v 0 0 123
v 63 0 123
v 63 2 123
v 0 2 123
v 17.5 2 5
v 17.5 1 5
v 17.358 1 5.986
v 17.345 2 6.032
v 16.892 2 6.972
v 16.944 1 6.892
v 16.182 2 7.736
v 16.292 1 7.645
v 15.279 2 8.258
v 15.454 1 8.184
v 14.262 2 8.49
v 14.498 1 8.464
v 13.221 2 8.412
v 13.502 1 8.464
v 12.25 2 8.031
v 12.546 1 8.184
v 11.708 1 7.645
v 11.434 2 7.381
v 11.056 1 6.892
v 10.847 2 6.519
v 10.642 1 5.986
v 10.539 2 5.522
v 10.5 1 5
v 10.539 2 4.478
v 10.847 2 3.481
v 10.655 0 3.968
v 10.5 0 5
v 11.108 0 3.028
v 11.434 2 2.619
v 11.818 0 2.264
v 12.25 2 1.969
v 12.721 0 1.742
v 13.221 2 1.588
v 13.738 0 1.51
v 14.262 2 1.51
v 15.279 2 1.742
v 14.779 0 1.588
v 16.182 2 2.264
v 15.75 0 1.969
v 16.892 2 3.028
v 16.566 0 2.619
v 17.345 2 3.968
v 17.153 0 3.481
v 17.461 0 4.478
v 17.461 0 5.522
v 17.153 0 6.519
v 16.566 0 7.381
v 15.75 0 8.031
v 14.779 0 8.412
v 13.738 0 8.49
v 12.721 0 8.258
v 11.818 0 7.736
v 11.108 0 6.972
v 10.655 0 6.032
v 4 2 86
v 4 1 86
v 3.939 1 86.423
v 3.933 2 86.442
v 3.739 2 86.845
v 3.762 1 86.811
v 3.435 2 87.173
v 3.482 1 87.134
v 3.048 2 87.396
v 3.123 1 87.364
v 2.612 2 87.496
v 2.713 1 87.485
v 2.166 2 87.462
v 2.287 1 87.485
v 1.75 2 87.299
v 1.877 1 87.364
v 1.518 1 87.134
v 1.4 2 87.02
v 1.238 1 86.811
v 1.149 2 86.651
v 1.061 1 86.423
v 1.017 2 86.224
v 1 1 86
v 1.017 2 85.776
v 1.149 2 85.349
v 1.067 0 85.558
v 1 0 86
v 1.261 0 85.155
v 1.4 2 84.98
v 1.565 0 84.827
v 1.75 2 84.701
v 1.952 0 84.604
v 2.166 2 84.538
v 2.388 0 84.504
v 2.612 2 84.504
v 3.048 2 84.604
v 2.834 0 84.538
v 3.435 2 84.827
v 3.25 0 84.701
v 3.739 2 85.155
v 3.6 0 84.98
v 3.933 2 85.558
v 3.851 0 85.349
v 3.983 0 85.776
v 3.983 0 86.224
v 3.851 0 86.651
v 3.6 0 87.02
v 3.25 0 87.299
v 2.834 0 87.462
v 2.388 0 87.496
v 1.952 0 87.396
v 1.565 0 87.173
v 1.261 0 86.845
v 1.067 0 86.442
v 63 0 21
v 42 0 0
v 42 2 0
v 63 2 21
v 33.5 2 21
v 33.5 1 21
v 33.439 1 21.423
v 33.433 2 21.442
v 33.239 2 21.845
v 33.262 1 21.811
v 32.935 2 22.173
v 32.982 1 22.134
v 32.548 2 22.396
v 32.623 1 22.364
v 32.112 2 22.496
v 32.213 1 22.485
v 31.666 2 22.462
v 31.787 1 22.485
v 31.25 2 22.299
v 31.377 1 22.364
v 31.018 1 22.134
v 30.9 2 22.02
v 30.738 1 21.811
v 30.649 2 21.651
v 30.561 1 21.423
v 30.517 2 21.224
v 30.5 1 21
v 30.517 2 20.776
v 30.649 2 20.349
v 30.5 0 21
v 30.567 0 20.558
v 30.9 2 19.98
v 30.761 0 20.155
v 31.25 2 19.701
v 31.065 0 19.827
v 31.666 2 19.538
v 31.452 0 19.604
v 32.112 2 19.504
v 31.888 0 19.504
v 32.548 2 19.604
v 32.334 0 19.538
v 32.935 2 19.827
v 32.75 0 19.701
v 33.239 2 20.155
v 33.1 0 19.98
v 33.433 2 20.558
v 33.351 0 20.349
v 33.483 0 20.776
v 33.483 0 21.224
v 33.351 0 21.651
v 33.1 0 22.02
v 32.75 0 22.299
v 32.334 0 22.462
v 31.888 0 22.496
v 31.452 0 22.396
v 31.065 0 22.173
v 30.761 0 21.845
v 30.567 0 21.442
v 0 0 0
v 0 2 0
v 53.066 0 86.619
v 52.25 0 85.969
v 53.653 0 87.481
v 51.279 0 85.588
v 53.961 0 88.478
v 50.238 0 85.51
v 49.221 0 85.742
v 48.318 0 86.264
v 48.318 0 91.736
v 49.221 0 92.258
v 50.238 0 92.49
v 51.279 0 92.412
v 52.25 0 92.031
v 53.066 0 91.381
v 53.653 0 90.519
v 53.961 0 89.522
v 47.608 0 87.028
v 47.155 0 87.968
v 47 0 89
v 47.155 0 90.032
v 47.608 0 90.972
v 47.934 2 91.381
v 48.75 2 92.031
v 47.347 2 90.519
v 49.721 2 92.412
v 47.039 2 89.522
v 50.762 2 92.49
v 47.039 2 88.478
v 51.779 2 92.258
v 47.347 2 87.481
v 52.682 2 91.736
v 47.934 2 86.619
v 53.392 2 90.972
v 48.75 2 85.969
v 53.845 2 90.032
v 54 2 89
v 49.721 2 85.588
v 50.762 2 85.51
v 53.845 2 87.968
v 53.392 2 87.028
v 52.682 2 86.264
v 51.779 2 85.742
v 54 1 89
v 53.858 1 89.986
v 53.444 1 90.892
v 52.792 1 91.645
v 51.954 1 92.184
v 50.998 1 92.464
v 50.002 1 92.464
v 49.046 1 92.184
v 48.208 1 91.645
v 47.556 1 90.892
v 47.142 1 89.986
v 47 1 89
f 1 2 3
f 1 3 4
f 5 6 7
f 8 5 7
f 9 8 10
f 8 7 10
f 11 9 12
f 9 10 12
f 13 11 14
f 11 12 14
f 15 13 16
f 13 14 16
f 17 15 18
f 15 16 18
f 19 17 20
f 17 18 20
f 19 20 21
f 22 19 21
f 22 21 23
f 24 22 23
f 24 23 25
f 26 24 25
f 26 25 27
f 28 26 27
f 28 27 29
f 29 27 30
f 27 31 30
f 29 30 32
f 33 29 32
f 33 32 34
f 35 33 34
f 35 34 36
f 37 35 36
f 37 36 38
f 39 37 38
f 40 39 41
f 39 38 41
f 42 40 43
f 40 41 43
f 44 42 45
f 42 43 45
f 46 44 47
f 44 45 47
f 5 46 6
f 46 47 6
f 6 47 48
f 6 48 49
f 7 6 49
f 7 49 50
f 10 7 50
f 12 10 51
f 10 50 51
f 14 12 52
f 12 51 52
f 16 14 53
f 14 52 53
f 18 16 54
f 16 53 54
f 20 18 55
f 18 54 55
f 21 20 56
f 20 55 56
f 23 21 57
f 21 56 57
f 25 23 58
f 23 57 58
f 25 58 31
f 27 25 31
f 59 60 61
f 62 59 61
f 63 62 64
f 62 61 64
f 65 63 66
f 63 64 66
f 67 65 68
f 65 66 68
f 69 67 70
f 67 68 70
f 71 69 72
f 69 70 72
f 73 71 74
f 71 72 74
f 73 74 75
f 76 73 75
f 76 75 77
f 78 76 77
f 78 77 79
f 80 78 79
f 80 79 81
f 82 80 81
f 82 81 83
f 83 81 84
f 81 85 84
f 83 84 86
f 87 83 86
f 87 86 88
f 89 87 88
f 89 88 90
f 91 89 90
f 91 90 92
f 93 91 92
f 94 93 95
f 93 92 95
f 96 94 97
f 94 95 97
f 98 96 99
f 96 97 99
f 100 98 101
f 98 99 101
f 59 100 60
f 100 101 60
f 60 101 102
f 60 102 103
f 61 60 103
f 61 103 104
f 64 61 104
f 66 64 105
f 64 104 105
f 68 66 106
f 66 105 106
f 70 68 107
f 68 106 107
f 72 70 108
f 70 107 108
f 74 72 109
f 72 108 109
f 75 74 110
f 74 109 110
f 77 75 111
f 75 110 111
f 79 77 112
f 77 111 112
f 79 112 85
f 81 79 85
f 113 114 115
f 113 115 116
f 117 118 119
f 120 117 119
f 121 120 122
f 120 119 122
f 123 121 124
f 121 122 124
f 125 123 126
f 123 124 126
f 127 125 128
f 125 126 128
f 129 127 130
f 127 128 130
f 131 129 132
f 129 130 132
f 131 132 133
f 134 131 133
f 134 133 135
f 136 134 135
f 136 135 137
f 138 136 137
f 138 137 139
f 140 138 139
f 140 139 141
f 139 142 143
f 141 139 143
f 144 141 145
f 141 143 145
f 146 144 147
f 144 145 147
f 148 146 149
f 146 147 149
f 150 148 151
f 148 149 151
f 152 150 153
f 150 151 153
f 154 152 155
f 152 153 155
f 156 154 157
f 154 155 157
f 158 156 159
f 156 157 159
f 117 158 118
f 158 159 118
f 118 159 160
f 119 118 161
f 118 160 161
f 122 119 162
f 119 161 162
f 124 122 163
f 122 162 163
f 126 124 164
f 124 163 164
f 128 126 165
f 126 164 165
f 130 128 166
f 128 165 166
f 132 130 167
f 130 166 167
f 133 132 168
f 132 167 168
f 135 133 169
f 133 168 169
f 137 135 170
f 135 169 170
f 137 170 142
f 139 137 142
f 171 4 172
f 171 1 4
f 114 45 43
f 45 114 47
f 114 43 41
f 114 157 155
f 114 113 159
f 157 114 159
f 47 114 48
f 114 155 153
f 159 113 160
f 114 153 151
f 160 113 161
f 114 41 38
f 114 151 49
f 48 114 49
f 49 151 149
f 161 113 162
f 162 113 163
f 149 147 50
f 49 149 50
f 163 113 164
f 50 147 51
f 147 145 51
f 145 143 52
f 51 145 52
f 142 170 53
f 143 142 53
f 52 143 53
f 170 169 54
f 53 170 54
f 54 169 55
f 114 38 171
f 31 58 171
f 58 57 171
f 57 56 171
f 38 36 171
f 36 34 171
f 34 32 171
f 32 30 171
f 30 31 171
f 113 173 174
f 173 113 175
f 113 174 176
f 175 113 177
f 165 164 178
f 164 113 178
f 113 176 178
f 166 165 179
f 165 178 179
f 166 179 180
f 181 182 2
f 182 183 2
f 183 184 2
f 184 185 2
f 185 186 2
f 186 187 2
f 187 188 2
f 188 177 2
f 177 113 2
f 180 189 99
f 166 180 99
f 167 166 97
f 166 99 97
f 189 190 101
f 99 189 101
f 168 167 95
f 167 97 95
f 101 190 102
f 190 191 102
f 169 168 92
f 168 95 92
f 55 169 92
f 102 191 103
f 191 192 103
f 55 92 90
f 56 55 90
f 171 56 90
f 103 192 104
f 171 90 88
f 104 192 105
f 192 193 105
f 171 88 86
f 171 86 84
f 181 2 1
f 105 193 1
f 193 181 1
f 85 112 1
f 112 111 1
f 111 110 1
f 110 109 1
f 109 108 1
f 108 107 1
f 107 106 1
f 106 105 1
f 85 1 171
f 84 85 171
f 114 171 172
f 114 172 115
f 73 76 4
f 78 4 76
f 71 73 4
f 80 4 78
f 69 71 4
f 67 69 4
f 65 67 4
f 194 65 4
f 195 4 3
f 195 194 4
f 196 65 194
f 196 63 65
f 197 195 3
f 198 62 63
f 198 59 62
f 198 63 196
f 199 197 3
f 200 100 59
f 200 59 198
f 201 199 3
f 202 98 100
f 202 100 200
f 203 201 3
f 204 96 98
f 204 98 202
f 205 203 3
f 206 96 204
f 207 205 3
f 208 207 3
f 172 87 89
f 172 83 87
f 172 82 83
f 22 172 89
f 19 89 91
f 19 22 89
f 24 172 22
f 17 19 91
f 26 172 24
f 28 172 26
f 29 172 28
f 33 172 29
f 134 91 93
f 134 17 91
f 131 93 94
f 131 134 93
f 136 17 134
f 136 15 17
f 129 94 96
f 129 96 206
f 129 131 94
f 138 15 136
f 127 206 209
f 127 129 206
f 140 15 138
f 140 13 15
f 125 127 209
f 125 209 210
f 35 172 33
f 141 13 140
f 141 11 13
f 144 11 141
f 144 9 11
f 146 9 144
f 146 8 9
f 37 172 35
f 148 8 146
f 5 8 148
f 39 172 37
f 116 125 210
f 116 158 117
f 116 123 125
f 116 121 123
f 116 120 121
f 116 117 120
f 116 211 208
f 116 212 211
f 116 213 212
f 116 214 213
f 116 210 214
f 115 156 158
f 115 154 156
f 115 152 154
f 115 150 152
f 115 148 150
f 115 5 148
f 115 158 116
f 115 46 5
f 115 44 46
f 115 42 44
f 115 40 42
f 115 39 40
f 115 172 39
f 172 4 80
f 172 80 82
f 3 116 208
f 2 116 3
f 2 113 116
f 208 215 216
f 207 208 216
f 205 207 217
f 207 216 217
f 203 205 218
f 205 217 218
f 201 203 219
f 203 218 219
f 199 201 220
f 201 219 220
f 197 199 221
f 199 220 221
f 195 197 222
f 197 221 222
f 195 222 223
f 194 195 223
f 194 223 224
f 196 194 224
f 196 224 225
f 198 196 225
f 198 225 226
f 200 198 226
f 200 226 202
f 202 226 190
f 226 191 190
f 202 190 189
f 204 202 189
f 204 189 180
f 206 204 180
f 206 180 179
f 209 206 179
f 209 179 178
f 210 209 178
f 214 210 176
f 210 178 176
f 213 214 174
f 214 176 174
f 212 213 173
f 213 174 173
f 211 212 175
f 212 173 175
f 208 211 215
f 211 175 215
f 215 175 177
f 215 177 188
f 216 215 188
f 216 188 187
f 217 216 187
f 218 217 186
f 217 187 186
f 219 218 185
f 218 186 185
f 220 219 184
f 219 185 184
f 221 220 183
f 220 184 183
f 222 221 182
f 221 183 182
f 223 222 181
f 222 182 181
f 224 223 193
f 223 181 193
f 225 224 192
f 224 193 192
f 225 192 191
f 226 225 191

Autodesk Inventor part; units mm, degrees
ref_plane "YZ Plane" through (0, 0, 0) normal (1, 0, 0) x (0, 1, 0)
ref_plane "XZ Plane" through (0, 0, 0) normal (0, 1, 0) x (-1, 0, 0)
ref_plane "XY Plane" through (0, 0, 0) normal (0, 0, 1) x (1, 0, 0)
sketch "Skizze1" plane through (0, 0, 0) normal (0, 1, 0) x (-1, 0, 0)
  line L0 (0, 0) -> (-42, 0)
  line L1 (-63, 21) -> (-63, 123)
  line L2 (-63, 123) -> (0, 123)
  line L3 (0, 123) -> (0, 0)
  line L4 (-42, 0) -> (-63, 21)
  line L5 (-42, 0) -> (-12.3015, 0) construction
  circle A0 centre (-14, 5) radius 3.5
  circle A1 centre (-32, 21) radius 1.5
  circle A2 centre (-2.5, 86) radius 1.5
  circle A3 centre (-50.5, 89) radius 3.5
  dimension "d0" = 63
  dimension "d1" = 102
  dimension "d2" = 135
  dimension "d3" = 42
  dimension "d4" = 7
  dimension "d5" = 3
  dimension "d6" = 3
  dimension "d7" = 7
  dimension "d8" = 2.5
  dimension "d9" = 37
  dimension "d10" = 14
  dimension "d11" = 5
  dimension "d12" = 21
  dimension "d13" = 32
  dimension "d14" = 12.5
  dimension "d15" = 34
extrude "Extrusion1" add sketch "Skizze1" along normal blind 1
sketch "Sketch2" plane through (0, 1, 0) normal (0, 1, 0) x (1, 0, 0)
  circle A0 centre (50.5, -89) radius 3.5 projected
  circle A1 centre (14, -5) radius 3.5 projected
  circle A2 centre (2.5, -86) radius 1.5 projected
  circle A3 centre (32, -21) radius 1.5 projected
  line L0 (42, 0) -> (0, 0) projected
  line L1 (0, 0) -> (0, -123) projected
  line L2 (0, -123) -> (63, -123) projected
  line L3 (63, -123) -> (63, -21) projected
  line L4 (63, -21) -> (42, 0) projected
extrude "Extrusion2" add sketch "Sketch2" along normal blind 1
properties part number "01_PCBoard"
